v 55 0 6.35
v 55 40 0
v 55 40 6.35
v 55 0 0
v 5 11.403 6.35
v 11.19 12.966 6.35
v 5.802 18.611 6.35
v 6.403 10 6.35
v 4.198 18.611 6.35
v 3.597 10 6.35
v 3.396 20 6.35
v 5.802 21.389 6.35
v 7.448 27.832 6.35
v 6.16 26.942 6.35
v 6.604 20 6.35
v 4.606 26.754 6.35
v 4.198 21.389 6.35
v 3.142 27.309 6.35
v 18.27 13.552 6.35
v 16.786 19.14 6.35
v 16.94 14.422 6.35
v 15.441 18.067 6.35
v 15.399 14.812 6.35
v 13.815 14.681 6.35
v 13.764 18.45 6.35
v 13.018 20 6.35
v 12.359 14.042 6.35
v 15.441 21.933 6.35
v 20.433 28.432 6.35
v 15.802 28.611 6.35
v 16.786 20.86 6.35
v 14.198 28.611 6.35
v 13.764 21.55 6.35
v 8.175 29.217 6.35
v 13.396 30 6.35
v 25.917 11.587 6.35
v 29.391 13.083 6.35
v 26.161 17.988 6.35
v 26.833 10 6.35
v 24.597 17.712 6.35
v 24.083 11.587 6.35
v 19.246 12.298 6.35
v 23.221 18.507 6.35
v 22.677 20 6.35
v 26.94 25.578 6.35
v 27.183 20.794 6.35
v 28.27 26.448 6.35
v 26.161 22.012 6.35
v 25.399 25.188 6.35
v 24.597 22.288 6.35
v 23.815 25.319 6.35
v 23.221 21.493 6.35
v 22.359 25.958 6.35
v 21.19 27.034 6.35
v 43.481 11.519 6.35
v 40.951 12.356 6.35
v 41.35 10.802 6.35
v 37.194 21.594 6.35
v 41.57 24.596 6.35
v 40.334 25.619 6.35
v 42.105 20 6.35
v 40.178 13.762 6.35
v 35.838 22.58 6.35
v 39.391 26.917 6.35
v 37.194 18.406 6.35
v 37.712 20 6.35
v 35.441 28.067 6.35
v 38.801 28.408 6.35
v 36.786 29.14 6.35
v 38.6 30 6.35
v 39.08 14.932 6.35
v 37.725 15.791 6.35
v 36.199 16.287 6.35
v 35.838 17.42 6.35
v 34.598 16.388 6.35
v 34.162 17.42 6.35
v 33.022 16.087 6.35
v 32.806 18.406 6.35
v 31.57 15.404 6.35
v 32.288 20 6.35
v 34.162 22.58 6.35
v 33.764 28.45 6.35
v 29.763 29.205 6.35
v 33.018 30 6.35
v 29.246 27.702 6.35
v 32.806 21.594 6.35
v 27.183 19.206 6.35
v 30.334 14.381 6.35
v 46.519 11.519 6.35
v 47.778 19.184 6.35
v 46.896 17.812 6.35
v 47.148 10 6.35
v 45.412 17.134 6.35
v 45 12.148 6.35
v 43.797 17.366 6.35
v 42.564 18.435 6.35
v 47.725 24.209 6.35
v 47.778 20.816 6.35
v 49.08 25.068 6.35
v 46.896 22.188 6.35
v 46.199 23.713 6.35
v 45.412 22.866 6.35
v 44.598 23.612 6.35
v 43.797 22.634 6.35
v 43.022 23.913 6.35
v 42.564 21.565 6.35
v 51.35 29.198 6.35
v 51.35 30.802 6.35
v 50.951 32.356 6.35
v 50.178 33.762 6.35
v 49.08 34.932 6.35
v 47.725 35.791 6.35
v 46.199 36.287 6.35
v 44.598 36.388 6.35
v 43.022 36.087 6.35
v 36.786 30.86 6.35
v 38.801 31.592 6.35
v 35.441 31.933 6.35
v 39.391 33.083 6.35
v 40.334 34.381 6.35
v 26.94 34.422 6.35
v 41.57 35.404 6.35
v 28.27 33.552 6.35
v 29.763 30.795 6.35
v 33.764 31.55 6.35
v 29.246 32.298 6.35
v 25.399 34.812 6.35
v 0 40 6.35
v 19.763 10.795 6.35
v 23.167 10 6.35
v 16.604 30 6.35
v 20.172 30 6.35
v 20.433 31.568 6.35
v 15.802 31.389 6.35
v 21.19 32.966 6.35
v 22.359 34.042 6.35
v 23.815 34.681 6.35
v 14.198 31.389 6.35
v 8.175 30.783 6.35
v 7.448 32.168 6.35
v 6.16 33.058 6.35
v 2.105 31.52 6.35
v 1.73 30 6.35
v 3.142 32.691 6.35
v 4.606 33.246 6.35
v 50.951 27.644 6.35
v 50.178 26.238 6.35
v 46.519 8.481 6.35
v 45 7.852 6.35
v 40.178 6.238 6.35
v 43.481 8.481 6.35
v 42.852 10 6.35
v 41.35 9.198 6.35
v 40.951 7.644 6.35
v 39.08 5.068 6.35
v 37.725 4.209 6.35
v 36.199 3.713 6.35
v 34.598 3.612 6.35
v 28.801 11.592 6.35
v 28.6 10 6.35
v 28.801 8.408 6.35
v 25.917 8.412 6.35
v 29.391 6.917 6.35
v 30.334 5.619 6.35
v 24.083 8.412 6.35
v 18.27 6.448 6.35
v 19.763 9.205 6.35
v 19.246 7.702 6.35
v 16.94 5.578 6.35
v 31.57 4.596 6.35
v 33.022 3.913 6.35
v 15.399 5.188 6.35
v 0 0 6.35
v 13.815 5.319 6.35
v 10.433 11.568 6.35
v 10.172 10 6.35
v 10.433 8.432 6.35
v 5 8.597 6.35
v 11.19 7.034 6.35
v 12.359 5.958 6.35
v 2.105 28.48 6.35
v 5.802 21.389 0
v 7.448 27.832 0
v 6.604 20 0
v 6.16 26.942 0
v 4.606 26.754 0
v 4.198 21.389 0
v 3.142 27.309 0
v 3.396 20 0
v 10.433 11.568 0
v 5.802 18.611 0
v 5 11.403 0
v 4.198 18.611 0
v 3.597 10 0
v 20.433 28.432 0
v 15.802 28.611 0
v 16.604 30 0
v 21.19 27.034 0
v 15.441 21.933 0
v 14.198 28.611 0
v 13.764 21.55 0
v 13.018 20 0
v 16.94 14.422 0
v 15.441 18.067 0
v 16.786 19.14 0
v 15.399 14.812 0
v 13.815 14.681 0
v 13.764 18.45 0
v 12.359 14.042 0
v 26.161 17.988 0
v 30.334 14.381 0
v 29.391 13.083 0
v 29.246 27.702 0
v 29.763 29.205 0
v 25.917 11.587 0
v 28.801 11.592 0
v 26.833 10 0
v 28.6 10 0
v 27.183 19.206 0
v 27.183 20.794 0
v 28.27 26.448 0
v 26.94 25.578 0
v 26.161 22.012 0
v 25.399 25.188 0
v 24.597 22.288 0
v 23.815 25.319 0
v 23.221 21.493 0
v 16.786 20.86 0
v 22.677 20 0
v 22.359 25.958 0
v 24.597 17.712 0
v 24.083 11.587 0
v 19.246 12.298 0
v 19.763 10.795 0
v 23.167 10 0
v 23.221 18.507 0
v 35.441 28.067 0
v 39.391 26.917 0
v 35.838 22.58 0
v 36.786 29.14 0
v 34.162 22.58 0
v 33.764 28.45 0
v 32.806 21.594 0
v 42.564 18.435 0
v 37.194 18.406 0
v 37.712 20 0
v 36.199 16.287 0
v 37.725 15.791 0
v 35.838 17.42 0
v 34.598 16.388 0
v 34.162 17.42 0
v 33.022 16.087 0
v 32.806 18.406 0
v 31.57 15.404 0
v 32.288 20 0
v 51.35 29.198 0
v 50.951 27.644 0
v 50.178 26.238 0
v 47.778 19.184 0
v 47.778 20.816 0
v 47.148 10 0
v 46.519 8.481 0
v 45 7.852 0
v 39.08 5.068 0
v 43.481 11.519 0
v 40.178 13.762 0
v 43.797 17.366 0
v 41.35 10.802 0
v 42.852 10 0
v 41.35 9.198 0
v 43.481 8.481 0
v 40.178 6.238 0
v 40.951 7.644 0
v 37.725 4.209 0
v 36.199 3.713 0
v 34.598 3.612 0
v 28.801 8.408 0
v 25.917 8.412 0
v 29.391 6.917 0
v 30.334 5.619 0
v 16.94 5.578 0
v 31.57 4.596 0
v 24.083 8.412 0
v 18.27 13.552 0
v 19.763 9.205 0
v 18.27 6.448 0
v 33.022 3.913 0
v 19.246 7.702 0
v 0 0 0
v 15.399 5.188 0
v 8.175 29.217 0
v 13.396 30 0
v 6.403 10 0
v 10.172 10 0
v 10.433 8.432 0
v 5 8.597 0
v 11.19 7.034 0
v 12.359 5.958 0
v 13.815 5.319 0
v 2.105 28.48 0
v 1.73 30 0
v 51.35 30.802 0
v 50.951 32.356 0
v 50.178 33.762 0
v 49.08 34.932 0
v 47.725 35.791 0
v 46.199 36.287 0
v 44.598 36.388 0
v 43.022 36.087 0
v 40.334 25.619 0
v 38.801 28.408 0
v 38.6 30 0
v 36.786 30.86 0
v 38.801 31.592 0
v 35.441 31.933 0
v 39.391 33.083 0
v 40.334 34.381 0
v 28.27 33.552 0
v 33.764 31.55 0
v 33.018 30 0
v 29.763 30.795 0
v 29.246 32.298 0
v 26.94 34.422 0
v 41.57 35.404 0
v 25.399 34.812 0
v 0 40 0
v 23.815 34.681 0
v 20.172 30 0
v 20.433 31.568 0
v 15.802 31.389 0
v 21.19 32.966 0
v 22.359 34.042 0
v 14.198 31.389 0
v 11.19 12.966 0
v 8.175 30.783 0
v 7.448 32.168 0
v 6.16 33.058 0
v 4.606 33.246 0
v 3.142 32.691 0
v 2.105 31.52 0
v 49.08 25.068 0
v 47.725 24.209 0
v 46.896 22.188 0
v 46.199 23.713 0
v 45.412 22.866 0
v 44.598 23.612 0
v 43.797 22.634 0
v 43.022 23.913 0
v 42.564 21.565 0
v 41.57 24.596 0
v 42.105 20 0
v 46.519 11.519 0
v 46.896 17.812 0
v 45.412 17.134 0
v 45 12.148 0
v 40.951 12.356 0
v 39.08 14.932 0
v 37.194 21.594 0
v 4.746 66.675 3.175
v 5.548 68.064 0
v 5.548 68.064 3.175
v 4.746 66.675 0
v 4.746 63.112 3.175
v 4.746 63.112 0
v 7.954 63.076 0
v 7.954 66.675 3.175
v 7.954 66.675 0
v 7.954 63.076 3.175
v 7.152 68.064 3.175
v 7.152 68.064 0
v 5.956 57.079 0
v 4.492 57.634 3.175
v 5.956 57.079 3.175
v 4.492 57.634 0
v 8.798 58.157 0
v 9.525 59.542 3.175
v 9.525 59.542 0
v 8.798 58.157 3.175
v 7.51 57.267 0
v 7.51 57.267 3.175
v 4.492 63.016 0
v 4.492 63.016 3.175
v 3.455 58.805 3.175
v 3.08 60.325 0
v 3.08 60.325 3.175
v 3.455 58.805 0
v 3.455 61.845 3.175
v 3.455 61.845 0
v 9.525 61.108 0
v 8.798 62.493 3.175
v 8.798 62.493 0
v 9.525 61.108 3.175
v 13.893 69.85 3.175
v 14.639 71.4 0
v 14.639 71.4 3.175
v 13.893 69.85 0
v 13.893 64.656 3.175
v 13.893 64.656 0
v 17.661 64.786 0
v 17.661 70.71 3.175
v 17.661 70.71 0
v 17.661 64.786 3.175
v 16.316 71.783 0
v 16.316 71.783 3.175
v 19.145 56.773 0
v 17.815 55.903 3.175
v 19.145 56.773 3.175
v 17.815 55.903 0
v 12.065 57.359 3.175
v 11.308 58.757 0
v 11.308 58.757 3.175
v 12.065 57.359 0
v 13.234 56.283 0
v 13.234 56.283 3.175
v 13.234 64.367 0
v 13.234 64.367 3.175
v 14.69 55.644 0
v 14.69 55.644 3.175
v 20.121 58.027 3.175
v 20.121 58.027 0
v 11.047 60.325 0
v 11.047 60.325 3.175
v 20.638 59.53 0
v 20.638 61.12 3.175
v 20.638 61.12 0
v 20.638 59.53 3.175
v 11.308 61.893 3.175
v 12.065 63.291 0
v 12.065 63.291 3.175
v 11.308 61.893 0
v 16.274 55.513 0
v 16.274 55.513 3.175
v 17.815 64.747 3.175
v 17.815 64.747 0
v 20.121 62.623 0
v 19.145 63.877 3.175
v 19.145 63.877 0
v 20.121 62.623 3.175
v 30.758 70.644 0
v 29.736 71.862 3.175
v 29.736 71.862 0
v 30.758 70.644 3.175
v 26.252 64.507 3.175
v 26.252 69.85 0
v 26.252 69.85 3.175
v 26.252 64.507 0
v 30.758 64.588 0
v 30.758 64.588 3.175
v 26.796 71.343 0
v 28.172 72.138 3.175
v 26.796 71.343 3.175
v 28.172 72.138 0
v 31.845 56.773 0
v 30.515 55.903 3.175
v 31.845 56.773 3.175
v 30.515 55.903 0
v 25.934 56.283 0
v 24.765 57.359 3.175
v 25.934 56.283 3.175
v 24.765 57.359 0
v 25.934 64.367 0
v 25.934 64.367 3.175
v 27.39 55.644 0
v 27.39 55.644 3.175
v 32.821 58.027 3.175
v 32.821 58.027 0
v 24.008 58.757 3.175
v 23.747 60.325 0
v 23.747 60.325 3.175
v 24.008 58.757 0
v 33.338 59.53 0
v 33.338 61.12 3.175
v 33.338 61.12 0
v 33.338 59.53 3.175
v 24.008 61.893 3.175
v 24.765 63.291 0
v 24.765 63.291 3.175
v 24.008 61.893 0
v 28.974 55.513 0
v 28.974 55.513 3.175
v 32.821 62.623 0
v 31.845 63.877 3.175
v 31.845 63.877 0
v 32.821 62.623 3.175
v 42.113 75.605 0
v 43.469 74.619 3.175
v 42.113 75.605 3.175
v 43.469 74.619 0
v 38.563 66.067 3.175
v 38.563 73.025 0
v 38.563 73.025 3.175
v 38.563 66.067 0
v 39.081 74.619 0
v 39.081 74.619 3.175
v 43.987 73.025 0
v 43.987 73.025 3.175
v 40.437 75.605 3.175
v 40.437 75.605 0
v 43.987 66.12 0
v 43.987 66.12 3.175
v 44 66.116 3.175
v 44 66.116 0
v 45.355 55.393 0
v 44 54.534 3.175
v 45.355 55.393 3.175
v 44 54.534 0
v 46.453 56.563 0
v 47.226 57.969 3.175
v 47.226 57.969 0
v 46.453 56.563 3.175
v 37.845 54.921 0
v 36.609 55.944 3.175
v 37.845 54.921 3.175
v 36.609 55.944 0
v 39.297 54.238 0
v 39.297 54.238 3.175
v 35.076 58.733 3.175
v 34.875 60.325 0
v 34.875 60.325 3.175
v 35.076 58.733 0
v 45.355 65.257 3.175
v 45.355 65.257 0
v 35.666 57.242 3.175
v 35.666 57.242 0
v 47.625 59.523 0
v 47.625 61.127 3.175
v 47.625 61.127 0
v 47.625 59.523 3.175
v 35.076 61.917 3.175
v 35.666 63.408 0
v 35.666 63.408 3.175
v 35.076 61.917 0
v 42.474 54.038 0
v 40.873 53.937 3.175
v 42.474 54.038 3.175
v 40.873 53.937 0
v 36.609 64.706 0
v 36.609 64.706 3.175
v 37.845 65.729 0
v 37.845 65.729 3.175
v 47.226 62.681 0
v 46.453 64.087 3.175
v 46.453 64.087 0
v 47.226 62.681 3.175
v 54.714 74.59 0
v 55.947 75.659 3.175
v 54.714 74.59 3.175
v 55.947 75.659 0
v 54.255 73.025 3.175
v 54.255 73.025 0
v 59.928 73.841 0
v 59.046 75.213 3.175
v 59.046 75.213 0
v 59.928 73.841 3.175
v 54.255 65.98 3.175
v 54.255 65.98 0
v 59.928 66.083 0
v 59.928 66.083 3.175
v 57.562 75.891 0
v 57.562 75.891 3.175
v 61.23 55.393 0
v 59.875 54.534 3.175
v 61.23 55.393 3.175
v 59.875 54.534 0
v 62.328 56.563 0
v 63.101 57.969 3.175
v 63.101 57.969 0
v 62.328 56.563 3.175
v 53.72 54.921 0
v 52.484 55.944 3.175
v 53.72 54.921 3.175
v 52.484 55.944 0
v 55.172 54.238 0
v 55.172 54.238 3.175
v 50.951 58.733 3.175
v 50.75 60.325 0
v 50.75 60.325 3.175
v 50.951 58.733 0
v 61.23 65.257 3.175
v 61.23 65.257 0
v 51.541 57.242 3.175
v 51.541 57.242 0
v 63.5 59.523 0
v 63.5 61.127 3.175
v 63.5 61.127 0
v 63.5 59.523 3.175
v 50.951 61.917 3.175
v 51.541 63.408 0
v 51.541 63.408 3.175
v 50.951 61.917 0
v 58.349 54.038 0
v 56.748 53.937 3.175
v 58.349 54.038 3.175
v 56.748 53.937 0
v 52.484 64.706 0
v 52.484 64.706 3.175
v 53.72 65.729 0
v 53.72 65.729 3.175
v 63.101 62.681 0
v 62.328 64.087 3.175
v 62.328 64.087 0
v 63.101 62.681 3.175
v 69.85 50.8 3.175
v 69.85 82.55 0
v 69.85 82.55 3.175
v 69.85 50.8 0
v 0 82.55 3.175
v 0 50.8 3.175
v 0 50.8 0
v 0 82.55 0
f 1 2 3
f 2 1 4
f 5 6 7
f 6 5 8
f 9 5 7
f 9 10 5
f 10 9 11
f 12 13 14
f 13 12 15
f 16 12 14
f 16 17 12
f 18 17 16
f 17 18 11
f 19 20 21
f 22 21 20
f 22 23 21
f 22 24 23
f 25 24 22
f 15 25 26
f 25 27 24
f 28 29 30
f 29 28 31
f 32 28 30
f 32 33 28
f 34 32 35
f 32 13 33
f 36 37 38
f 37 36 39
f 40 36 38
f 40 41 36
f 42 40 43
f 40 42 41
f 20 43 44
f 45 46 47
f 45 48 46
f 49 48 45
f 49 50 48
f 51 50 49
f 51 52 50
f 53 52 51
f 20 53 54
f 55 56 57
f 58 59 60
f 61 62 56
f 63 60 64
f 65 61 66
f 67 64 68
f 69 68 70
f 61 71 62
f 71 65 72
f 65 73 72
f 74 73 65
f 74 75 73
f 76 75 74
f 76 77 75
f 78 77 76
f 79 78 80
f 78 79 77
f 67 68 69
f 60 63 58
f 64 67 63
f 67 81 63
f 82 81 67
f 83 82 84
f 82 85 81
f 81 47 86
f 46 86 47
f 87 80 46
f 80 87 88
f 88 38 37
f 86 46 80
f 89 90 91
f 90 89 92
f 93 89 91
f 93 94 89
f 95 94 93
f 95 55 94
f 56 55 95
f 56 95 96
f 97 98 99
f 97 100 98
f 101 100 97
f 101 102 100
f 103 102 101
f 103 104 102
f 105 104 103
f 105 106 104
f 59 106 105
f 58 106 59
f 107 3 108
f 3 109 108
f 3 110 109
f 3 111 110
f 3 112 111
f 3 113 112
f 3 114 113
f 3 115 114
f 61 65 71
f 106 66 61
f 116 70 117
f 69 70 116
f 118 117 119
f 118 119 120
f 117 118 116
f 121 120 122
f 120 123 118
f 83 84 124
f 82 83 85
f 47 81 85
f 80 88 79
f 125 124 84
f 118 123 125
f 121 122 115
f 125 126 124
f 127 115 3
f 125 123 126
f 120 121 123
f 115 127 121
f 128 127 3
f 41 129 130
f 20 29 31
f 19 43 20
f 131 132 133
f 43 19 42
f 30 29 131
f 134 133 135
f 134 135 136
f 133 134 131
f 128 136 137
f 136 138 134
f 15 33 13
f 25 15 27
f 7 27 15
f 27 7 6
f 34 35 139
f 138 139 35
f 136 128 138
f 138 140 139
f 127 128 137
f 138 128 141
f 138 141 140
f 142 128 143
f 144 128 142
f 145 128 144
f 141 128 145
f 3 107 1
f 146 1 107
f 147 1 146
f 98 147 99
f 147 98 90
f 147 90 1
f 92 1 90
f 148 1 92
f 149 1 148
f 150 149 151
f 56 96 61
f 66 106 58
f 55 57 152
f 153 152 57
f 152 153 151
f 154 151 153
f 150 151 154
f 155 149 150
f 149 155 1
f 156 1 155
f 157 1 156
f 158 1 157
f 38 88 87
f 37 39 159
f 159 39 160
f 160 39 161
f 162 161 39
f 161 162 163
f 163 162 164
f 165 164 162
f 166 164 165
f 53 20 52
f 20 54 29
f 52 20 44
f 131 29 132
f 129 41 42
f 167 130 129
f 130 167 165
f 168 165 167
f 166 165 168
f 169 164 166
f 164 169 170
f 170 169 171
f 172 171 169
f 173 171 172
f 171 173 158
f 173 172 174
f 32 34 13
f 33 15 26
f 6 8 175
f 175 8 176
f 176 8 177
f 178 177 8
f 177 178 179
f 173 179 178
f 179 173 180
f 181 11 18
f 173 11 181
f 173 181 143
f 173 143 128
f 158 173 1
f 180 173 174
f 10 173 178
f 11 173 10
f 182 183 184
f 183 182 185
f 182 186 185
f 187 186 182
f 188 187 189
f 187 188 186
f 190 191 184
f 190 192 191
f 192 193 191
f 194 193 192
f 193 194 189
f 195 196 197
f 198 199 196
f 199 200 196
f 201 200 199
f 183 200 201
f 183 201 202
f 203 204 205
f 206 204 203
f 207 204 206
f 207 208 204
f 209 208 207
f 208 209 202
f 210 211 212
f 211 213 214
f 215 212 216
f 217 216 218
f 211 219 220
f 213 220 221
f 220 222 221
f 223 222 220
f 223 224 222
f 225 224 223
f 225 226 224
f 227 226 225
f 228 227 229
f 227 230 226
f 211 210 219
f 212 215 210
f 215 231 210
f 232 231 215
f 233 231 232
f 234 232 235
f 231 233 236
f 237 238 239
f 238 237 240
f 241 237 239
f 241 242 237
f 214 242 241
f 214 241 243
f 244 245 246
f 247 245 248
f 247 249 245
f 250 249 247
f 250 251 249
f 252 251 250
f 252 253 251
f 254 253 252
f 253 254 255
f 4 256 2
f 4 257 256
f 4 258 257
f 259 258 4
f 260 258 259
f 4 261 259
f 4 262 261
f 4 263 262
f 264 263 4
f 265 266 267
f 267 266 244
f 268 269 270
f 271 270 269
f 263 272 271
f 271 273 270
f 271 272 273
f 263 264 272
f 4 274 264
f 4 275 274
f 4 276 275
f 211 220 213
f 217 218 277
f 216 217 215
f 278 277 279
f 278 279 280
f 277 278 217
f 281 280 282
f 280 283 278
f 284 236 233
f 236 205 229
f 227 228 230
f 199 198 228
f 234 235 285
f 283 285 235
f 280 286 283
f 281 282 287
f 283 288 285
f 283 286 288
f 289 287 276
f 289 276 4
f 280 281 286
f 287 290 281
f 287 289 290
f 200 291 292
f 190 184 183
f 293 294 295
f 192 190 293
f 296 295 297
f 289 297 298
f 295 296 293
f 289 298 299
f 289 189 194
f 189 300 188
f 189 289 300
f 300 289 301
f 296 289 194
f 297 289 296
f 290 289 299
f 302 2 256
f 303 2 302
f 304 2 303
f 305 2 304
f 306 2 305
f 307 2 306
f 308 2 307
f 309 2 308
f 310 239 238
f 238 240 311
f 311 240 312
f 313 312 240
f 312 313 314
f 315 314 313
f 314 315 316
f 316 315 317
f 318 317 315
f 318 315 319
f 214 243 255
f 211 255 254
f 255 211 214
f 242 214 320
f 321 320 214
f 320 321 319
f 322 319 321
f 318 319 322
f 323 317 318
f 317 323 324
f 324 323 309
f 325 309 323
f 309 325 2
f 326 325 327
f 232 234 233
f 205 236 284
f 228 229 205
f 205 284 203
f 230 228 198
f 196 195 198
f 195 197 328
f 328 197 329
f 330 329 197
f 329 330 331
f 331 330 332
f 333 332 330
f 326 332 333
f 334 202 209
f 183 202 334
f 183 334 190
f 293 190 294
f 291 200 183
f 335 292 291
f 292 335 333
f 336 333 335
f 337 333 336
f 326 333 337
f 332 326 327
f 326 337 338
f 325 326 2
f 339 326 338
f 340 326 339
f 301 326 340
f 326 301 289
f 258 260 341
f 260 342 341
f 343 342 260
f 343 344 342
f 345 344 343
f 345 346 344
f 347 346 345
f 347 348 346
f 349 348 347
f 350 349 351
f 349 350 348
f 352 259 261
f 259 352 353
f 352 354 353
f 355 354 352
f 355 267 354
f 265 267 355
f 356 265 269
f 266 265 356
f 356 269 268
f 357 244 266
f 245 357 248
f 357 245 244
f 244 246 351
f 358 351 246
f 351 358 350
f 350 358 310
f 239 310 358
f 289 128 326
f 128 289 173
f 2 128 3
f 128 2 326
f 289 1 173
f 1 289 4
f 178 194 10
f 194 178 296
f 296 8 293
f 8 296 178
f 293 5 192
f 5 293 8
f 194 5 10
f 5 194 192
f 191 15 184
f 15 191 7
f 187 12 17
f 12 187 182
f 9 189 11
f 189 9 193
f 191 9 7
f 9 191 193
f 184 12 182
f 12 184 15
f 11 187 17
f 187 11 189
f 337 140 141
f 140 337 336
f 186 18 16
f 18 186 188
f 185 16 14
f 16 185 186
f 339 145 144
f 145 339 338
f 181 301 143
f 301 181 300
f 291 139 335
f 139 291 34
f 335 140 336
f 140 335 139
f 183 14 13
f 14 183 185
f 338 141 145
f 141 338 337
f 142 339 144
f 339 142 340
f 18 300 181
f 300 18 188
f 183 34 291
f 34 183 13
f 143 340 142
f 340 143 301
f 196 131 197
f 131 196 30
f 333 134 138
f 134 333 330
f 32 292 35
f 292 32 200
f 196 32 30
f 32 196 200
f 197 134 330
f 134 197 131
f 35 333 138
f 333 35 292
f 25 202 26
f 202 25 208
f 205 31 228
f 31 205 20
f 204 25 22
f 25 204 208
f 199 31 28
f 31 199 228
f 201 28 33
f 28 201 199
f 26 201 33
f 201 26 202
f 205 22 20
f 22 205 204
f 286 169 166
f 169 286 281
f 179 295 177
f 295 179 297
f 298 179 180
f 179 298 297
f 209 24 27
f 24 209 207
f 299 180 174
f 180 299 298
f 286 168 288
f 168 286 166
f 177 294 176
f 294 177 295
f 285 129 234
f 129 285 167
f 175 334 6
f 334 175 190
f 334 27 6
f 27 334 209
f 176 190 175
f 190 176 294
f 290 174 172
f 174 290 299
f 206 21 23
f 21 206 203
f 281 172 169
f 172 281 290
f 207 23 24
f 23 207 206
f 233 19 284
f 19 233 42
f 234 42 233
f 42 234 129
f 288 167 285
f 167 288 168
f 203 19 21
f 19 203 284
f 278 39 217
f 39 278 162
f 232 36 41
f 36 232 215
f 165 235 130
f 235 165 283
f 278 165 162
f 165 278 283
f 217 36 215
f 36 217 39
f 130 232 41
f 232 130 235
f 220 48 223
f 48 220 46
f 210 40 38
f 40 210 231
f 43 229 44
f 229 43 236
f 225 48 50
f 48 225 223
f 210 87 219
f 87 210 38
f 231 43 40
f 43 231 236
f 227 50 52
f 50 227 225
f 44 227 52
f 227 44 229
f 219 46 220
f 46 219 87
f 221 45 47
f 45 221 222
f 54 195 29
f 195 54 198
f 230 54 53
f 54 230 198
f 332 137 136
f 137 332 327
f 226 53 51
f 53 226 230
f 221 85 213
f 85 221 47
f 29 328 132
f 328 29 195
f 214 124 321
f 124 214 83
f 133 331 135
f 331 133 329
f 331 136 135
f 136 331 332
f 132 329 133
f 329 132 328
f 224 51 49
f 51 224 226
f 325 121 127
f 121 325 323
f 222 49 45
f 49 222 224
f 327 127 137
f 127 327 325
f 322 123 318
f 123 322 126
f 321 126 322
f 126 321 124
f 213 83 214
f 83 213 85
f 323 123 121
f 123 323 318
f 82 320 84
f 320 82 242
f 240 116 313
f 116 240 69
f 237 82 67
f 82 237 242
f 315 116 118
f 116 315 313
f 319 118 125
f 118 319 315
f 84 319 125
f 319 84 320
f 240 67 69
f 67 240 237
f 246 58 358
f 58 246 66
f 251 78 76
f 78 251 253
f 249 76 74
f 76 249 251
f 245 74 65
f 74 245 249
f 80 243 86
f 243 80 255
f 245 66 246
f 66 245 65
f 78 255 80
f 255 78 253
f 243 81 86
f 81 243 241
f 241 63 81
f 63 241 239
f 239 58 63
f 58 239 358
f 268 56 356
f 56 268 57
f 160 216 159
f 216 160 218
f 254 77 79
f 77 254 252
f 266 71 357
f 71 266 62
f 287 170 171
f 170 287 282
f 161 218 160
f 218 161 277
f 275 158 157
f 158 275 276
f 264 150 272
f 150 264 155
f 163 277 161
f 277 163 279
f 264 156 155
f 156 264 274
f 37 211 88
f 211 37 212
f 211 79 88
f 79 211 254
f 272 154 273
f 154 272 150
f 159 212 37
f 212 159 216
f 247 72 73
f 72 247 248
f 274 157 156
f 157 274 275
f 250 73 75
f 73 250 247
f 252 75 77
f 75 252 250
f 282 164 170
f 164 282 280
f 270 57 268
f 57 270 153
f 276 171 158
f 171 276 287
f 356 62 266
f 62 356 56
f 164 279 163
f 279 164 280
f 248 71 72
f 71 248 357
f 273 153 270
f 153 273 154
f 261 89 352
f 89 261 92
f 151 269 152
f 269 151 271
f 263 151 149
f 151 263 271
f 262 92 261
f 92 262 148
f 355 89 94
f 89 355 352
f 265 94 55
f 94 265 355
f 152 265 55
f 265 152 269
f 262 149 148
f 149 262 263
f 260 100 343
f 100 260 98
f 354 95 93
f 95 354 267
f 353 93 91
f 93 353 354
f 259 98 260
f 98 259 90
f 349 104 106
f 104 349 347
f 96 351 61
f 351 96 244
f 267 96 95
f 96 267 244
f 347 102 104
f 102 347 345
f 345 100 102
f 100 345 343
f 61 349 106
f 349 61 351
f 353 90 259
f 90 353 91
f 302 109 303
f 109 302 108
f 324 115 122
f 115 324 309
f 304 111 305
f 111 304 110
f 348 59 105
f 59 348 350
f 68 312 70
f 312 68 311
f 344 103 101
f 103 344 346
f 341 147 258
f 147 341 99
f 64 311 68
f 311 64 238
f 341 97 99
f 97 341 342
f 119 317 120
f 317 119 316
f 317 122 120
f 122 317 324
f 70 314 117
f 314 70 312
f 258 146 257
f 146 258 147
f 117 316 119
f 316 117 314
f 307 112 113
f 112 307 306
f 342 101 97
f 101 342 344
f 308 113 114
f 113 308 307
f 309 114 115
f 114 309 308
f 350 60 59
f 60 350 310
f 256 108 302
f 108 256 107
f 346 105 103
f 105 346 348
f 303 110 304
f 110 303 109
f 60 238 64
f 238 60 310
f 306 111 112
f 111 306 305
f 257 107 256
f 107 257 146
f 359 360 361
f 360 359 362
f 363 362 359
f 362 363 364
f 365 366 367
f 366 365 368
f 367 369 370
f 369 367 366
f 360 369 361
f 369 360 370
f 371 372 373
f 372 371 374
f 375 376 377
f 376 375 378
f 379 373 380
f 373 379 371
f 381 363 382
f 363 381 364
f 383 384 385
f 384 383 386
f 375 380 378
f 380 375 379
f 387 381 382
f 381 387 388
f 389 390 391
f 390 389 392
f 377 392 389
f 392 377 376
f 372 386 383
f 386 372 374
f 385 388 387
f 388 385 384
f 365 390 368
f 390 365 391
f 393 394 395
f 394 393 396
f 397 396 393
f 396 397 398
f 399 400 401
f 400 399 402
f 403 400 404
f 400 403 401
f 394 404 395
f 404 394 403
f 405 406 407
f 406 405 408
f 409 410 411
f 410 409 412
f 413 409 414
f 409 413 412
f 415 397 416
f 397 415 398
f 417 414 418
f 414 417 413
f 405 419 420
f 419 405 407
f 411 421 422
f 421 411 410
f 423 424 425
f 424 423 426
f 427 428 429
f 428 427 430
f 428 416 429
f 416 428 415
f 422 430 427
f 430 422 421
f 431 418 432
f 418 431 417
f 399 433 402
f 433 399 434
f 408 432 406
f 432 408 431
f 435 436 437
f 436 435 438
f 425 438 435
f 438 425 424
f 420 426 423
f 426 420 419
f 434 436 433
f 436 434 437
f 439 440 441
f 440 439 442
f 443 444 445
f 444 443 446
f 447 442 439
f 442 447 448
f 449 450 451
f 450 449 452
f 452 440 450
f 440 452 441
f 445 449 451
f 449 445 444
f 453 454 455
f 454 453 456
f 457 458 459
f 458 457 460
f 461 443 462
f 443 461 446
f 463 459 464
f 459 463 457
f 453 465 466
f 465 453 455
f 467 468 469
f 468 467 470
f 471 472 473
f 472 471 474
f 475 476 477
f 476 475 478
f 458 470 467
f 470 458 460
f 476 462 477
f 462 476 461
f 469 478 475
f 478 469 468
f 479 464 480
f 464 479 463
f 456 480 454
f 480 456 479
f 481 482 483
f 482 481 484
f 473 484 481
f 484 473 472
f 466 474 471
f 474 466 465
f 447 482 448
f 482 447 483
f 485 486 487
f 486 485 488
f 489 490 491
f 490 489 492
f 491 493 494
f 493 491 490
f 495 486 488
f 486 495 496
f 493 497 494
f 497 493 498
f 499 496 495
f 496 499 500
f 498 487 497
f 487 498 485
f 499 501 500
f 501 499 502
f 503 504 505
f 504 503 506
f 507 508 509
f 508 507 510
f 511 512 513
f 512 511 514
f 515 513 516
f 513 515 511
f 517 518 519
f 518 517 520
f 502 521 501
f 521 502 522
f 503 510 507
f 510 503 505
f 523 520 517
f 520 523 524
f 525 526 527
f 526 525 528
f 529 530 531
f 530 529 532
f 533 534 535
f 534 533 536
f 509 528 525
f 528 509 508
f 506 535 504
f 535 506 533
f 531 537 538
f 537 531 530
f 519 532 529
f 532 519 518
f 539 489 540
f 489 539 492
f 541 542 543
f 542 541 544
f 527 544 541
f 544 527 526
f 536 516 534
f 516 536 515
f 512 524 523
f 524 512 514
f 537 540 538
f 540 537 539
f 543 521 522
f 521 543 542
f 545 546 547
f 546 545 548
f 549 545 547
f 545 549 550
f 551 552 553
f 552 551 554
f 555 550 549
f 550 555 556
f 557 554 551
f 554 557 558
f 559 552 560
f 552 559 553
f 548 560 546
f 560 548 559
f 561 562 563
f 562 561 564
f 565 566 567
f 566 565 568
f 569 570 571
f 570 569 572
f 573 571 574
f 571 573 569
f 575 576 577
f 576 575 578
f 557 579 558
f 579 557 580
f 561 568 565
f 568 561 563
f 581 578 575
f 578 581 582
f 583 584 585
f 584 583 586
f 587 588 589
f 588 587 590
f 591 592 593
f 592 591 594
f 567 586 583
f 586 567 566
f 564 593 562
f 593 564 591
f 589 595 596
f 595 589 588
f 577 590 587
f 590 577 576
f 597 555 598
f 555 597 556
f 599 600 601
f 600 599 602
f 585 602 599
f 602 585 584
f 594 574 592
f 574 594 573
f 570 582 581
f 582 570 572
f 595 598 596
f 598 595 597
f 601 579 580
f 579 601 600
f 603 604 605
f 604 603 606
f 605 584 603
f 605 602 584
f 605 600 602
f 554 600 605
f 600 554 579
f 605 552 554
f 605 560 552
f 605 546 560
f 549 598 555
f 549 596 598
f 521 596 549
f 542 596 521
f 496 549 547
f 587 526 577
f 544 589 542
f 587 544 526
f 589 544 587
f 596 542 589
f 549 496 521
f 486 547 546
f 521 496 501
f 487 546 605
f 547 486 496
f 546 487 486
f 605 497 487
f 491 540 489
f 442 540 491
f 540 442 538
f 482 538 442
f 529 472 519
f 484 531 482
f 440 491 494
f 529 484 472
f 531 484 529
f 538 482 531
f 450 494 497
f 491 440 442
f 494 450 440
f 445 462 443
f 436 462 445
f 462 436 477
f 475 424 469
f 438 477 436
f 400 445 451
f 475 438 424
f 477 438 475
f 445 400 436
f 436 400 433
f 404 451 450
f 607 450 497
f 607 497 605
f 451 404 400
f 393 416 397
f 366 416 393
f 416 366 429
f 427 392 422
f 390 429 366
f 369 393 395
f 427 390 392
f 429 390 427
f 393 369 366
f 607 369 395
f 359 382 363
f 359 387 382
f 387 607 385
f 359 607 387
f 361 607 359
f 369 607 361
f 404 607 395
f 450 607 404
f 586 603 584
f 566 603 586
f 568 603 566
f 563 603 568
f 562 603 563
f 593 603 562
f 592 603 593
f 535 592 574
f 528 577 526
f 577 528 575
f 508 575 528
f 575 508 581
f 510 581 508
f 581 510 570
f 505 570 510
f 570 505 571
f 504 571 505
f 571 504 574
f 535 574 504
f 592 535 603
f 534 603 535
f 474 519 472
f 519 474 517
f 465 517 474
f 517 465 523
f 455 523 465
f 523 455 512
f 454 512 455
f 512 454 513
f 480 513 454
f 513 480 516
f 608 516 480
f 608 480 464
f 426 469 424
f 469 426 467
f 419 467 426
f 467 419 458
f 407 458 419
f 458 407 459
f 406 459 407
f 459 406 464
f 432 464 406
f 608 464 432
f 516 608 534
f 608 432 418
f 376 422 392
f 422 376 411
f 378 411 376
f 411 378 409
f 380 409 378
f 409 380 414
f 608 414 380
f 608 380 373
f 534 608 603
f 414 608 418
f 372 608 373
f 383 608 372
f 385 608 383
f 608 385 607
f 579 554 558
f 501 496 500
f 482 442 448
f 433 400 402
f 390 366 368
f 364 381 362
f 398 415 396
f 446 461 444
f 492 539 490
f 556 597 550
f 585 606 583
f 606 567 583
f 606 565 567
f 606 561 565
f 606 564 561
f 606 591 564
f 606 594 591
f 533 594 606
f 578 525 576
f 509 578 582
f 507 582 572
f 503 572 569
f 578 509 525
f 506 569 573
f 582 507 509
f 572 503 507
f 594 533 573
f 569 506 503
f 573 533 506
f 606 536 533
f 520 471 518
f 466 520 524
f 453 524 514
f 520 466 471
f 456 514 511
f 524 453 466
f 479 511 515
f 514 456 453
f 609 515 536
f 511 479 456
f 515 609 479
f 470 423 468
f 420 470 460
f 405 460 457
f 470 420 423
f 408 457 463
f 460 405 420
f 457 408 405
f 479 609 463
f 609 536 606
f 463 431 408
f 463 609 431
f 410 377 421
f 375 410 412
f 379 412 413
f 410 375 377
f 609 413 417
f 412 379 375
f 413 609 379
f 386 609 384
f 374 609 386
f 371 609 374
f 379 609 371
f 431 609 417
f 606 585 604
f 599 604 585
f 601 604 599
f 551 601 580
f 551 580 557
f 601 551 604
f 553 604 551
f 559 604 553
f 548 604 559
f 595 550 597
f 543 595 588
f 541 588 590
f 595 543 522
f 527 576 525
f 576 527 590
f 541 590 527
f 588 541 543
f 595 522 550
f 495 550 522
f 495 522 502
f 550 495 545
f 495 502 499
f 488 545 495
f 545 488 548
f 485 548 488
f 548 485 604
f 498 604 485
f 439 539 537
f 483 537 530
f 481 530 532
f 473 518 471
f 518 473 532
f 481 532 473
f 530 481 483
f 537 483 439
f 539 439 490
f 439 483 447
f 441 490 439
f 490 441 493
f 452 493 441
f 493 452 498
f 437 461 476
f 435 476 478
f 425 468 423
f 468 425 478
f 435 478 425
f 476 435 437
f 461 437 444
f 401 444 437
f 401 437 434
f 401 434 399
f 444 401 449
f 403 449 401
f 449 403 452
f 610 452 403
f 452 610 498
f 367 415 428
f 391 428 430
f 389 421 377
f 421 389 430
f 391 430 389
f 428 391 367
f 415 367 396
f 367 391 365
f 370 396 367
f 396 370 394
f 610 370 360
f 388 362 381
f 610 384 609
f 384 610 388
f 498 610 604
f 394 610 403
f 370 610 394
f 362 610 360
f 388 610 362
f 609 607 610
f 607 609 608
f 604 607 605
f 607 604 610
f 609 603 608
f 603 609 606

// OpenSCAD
/*
 * WhateverSCAD by John Strunk is licensed under the Creative Commons
 * Attribution-ShareAlike 4.0 International License. To view a copy of
 * this license, visit http://creativecommons.org/licenses/by-sa/4.0/
 * or send a letter to Creative Commons, 444 Castro Street, Suite 900,
 * Mountain View, California, 94041, USA.
 */

/*****************************
 * PilotHole4(h, center)
 * Cylinders that can be differenced to create pilot holes,
 * through holes, or head counterbores for SAE screws.
 * See: http://www.wlfuller.com/html/wood_screw_chart.html
 * Current support for #4, #6, #8, #10, and #12 pilot, shank, and head
 * holes.
 * h: The depth (height) of the hole
 * center: True if the depth should be centered at z=0 (default=false)
 ****************************/

/*****************************
 * Keyhole6(h)
 * Create a "keyhole" slot for a #6 screw. Supports sizes #4, #6, #8,
 * #10, and #12.
 * h: The depth (height) of the slot to create
 ****************************/

use <MCAD/polyholes.scad>

/**
 * Convert inches to mm.
 * in: The measurement in inches
 * returns: The measurement in mm
 */
function inch(in) = 25.4 * in;

_ep = 0.0001;

/**
 * Correction factor in case the stock hole sizes are the wrong size. This
 * serves as a multiplier on the hole diameter, so 1.1 would be 110% of
 * nominal.
 */
screwCorrection = 1.0;

module HeadHole4(h, center=false) { _screwHole(h, center, inch(1/4)); }
module PilotHole4(h, center=false) { _screwHole(h, center, inch(5/64)); }
module ShankHole4(h, center=false) { _screwHole(h, center, inch(7/64)); }
module HeadHole6(h, center=false) { _screwHole(h, center, inch(3/8)); }
module PilotHole6(h, center=false) { _screwHole(h, center, inch(7/64)); }
module ShankHole6(h, center=false) { _screwHole(h, center, inch(9/64)); }
module HeadHole8(h, center=false) { _screwHole(h, center, inch(3/8)); }
module PilotHole8(h, center=false) { _screwHole(h, center, inch(1/8)); }
module ShankHole8(h, center=false) { _screwHole(h, center, inch(11/64)); }
module HeadHole10(h, center=false) { _screwHole(h, center, inch(1/2)); }
module PilotHole10(h, center=false) { _screwHole(h, center, inch(9/64)); }
module ShankHole10(h, center=false) { _screwHole(h, center, inch(13/64)); }
module HeadHole12(h, center=false) { _screwHole(h, center, inch(1/2)); }
module PilotHole12(h, center=false) { _screwHole(h, center, inch(5/32)); }
module ShankHole12(h, center=false) { _screwHole(h, center, inch(7/32)); }

module _screwHole(h, center, d) {
	if (center) {
		translate([0, 0, -h/2])	polyhole(h=h, d=screwCorrection * d);
	} else {
		polyhole(h=h, d=screwCorrection * d);
	}
}

module Keyhole4(h) { _keyHole(inch(1/4)) { HeadHole4(h); ShankHole4(h); }}
module Keyhole6(h) { _keyHole(inch(3/8)) { HeadHole6(h); ShankHole6(h); }}
module Keyhole8(h) { _keyHole(inch(3/8)) { HeadHole8(h); ShankHole8(h); }}
module Keyhole10(h) { _keyHole(inch(1/2)) { HeadHole10(h); ShankHole10(h); }}
module Keyhole12(h) { _keyHole(inch(1/2)) { HeadHole12(h); ShankHole12(h); }}

module _keyHole(offset) {
	union() {
		hull() { // make a slot
			children(1);
			translate([0, offset, 0]) children(1);
		}
		children(0); // punch hole for the head
	}
}

module _testScrewHoles() {
	thickness = inch(0.25);
	difference() {
		cube([55, 40, thickness]);
		translate([5, 10, -0.1]) PilotHole4(thickness+1);
		translate([5, 20, -0.1]) ShankHole4(thickness+1);
		translate([5, 30, -0.1]) HeadHole4(thickness+1);
		translate([15, 30, -0.1]) PilotHole6(thickness+1);
		translate([15, 20, -0.1]) ShankHole6(thickness+1);
		translate([15, 10, -0.1]) HeadHole6(thickness+1);
		translate([25, 10, -0.1]) PilotHole8(thickness+1);
		translate([25, 20, -0.1]) ShankHole8(thickness+1);
		translate([25, 30, -0.1]) HeadHole8(thickness+1);
		translate([35, 30, -0.1]) PilotHole10(thickness+1);
		translate([35, 20, -0.1]) ShankHole10(thickness+1);
		translate([35, 10, -0.1]) HeadHole10(thickness+1);
		translate([45, 10, -0.1]) PilotHole12(thickness+1);
		translate([45, 20, -0.1]) ShankHole12(thickness+1);
		translate([45, 30, -0.1]) HeadHole12(thickness+1);
	}
}

module _testKeyholes() {
	thickness = inch(1/8);
	difference() {
		cube([inch(2.75), inch(1.25), thickness]);
		translate([inch(1/4), inch(3/8), -0.1]) Keyhole4(thickness+1);
		translate([inch(5/8), inch(3/8), -0.1]) Keyhole6(thickness+1);
		translate([inch(1.125), inch(3/8), -0.1]) Keyhole8(thickness+1);
		translate([inch(1.625), inch(3/8), -0.1]) Keyhole10(thickness+1);
		translate([inch(2.25), inch(3/8), -0.1]) Keyhole12(thickness+1);
	}
}
_testScrewHoles();
translate([0, inch(2), 0]) _testKeyholes();
